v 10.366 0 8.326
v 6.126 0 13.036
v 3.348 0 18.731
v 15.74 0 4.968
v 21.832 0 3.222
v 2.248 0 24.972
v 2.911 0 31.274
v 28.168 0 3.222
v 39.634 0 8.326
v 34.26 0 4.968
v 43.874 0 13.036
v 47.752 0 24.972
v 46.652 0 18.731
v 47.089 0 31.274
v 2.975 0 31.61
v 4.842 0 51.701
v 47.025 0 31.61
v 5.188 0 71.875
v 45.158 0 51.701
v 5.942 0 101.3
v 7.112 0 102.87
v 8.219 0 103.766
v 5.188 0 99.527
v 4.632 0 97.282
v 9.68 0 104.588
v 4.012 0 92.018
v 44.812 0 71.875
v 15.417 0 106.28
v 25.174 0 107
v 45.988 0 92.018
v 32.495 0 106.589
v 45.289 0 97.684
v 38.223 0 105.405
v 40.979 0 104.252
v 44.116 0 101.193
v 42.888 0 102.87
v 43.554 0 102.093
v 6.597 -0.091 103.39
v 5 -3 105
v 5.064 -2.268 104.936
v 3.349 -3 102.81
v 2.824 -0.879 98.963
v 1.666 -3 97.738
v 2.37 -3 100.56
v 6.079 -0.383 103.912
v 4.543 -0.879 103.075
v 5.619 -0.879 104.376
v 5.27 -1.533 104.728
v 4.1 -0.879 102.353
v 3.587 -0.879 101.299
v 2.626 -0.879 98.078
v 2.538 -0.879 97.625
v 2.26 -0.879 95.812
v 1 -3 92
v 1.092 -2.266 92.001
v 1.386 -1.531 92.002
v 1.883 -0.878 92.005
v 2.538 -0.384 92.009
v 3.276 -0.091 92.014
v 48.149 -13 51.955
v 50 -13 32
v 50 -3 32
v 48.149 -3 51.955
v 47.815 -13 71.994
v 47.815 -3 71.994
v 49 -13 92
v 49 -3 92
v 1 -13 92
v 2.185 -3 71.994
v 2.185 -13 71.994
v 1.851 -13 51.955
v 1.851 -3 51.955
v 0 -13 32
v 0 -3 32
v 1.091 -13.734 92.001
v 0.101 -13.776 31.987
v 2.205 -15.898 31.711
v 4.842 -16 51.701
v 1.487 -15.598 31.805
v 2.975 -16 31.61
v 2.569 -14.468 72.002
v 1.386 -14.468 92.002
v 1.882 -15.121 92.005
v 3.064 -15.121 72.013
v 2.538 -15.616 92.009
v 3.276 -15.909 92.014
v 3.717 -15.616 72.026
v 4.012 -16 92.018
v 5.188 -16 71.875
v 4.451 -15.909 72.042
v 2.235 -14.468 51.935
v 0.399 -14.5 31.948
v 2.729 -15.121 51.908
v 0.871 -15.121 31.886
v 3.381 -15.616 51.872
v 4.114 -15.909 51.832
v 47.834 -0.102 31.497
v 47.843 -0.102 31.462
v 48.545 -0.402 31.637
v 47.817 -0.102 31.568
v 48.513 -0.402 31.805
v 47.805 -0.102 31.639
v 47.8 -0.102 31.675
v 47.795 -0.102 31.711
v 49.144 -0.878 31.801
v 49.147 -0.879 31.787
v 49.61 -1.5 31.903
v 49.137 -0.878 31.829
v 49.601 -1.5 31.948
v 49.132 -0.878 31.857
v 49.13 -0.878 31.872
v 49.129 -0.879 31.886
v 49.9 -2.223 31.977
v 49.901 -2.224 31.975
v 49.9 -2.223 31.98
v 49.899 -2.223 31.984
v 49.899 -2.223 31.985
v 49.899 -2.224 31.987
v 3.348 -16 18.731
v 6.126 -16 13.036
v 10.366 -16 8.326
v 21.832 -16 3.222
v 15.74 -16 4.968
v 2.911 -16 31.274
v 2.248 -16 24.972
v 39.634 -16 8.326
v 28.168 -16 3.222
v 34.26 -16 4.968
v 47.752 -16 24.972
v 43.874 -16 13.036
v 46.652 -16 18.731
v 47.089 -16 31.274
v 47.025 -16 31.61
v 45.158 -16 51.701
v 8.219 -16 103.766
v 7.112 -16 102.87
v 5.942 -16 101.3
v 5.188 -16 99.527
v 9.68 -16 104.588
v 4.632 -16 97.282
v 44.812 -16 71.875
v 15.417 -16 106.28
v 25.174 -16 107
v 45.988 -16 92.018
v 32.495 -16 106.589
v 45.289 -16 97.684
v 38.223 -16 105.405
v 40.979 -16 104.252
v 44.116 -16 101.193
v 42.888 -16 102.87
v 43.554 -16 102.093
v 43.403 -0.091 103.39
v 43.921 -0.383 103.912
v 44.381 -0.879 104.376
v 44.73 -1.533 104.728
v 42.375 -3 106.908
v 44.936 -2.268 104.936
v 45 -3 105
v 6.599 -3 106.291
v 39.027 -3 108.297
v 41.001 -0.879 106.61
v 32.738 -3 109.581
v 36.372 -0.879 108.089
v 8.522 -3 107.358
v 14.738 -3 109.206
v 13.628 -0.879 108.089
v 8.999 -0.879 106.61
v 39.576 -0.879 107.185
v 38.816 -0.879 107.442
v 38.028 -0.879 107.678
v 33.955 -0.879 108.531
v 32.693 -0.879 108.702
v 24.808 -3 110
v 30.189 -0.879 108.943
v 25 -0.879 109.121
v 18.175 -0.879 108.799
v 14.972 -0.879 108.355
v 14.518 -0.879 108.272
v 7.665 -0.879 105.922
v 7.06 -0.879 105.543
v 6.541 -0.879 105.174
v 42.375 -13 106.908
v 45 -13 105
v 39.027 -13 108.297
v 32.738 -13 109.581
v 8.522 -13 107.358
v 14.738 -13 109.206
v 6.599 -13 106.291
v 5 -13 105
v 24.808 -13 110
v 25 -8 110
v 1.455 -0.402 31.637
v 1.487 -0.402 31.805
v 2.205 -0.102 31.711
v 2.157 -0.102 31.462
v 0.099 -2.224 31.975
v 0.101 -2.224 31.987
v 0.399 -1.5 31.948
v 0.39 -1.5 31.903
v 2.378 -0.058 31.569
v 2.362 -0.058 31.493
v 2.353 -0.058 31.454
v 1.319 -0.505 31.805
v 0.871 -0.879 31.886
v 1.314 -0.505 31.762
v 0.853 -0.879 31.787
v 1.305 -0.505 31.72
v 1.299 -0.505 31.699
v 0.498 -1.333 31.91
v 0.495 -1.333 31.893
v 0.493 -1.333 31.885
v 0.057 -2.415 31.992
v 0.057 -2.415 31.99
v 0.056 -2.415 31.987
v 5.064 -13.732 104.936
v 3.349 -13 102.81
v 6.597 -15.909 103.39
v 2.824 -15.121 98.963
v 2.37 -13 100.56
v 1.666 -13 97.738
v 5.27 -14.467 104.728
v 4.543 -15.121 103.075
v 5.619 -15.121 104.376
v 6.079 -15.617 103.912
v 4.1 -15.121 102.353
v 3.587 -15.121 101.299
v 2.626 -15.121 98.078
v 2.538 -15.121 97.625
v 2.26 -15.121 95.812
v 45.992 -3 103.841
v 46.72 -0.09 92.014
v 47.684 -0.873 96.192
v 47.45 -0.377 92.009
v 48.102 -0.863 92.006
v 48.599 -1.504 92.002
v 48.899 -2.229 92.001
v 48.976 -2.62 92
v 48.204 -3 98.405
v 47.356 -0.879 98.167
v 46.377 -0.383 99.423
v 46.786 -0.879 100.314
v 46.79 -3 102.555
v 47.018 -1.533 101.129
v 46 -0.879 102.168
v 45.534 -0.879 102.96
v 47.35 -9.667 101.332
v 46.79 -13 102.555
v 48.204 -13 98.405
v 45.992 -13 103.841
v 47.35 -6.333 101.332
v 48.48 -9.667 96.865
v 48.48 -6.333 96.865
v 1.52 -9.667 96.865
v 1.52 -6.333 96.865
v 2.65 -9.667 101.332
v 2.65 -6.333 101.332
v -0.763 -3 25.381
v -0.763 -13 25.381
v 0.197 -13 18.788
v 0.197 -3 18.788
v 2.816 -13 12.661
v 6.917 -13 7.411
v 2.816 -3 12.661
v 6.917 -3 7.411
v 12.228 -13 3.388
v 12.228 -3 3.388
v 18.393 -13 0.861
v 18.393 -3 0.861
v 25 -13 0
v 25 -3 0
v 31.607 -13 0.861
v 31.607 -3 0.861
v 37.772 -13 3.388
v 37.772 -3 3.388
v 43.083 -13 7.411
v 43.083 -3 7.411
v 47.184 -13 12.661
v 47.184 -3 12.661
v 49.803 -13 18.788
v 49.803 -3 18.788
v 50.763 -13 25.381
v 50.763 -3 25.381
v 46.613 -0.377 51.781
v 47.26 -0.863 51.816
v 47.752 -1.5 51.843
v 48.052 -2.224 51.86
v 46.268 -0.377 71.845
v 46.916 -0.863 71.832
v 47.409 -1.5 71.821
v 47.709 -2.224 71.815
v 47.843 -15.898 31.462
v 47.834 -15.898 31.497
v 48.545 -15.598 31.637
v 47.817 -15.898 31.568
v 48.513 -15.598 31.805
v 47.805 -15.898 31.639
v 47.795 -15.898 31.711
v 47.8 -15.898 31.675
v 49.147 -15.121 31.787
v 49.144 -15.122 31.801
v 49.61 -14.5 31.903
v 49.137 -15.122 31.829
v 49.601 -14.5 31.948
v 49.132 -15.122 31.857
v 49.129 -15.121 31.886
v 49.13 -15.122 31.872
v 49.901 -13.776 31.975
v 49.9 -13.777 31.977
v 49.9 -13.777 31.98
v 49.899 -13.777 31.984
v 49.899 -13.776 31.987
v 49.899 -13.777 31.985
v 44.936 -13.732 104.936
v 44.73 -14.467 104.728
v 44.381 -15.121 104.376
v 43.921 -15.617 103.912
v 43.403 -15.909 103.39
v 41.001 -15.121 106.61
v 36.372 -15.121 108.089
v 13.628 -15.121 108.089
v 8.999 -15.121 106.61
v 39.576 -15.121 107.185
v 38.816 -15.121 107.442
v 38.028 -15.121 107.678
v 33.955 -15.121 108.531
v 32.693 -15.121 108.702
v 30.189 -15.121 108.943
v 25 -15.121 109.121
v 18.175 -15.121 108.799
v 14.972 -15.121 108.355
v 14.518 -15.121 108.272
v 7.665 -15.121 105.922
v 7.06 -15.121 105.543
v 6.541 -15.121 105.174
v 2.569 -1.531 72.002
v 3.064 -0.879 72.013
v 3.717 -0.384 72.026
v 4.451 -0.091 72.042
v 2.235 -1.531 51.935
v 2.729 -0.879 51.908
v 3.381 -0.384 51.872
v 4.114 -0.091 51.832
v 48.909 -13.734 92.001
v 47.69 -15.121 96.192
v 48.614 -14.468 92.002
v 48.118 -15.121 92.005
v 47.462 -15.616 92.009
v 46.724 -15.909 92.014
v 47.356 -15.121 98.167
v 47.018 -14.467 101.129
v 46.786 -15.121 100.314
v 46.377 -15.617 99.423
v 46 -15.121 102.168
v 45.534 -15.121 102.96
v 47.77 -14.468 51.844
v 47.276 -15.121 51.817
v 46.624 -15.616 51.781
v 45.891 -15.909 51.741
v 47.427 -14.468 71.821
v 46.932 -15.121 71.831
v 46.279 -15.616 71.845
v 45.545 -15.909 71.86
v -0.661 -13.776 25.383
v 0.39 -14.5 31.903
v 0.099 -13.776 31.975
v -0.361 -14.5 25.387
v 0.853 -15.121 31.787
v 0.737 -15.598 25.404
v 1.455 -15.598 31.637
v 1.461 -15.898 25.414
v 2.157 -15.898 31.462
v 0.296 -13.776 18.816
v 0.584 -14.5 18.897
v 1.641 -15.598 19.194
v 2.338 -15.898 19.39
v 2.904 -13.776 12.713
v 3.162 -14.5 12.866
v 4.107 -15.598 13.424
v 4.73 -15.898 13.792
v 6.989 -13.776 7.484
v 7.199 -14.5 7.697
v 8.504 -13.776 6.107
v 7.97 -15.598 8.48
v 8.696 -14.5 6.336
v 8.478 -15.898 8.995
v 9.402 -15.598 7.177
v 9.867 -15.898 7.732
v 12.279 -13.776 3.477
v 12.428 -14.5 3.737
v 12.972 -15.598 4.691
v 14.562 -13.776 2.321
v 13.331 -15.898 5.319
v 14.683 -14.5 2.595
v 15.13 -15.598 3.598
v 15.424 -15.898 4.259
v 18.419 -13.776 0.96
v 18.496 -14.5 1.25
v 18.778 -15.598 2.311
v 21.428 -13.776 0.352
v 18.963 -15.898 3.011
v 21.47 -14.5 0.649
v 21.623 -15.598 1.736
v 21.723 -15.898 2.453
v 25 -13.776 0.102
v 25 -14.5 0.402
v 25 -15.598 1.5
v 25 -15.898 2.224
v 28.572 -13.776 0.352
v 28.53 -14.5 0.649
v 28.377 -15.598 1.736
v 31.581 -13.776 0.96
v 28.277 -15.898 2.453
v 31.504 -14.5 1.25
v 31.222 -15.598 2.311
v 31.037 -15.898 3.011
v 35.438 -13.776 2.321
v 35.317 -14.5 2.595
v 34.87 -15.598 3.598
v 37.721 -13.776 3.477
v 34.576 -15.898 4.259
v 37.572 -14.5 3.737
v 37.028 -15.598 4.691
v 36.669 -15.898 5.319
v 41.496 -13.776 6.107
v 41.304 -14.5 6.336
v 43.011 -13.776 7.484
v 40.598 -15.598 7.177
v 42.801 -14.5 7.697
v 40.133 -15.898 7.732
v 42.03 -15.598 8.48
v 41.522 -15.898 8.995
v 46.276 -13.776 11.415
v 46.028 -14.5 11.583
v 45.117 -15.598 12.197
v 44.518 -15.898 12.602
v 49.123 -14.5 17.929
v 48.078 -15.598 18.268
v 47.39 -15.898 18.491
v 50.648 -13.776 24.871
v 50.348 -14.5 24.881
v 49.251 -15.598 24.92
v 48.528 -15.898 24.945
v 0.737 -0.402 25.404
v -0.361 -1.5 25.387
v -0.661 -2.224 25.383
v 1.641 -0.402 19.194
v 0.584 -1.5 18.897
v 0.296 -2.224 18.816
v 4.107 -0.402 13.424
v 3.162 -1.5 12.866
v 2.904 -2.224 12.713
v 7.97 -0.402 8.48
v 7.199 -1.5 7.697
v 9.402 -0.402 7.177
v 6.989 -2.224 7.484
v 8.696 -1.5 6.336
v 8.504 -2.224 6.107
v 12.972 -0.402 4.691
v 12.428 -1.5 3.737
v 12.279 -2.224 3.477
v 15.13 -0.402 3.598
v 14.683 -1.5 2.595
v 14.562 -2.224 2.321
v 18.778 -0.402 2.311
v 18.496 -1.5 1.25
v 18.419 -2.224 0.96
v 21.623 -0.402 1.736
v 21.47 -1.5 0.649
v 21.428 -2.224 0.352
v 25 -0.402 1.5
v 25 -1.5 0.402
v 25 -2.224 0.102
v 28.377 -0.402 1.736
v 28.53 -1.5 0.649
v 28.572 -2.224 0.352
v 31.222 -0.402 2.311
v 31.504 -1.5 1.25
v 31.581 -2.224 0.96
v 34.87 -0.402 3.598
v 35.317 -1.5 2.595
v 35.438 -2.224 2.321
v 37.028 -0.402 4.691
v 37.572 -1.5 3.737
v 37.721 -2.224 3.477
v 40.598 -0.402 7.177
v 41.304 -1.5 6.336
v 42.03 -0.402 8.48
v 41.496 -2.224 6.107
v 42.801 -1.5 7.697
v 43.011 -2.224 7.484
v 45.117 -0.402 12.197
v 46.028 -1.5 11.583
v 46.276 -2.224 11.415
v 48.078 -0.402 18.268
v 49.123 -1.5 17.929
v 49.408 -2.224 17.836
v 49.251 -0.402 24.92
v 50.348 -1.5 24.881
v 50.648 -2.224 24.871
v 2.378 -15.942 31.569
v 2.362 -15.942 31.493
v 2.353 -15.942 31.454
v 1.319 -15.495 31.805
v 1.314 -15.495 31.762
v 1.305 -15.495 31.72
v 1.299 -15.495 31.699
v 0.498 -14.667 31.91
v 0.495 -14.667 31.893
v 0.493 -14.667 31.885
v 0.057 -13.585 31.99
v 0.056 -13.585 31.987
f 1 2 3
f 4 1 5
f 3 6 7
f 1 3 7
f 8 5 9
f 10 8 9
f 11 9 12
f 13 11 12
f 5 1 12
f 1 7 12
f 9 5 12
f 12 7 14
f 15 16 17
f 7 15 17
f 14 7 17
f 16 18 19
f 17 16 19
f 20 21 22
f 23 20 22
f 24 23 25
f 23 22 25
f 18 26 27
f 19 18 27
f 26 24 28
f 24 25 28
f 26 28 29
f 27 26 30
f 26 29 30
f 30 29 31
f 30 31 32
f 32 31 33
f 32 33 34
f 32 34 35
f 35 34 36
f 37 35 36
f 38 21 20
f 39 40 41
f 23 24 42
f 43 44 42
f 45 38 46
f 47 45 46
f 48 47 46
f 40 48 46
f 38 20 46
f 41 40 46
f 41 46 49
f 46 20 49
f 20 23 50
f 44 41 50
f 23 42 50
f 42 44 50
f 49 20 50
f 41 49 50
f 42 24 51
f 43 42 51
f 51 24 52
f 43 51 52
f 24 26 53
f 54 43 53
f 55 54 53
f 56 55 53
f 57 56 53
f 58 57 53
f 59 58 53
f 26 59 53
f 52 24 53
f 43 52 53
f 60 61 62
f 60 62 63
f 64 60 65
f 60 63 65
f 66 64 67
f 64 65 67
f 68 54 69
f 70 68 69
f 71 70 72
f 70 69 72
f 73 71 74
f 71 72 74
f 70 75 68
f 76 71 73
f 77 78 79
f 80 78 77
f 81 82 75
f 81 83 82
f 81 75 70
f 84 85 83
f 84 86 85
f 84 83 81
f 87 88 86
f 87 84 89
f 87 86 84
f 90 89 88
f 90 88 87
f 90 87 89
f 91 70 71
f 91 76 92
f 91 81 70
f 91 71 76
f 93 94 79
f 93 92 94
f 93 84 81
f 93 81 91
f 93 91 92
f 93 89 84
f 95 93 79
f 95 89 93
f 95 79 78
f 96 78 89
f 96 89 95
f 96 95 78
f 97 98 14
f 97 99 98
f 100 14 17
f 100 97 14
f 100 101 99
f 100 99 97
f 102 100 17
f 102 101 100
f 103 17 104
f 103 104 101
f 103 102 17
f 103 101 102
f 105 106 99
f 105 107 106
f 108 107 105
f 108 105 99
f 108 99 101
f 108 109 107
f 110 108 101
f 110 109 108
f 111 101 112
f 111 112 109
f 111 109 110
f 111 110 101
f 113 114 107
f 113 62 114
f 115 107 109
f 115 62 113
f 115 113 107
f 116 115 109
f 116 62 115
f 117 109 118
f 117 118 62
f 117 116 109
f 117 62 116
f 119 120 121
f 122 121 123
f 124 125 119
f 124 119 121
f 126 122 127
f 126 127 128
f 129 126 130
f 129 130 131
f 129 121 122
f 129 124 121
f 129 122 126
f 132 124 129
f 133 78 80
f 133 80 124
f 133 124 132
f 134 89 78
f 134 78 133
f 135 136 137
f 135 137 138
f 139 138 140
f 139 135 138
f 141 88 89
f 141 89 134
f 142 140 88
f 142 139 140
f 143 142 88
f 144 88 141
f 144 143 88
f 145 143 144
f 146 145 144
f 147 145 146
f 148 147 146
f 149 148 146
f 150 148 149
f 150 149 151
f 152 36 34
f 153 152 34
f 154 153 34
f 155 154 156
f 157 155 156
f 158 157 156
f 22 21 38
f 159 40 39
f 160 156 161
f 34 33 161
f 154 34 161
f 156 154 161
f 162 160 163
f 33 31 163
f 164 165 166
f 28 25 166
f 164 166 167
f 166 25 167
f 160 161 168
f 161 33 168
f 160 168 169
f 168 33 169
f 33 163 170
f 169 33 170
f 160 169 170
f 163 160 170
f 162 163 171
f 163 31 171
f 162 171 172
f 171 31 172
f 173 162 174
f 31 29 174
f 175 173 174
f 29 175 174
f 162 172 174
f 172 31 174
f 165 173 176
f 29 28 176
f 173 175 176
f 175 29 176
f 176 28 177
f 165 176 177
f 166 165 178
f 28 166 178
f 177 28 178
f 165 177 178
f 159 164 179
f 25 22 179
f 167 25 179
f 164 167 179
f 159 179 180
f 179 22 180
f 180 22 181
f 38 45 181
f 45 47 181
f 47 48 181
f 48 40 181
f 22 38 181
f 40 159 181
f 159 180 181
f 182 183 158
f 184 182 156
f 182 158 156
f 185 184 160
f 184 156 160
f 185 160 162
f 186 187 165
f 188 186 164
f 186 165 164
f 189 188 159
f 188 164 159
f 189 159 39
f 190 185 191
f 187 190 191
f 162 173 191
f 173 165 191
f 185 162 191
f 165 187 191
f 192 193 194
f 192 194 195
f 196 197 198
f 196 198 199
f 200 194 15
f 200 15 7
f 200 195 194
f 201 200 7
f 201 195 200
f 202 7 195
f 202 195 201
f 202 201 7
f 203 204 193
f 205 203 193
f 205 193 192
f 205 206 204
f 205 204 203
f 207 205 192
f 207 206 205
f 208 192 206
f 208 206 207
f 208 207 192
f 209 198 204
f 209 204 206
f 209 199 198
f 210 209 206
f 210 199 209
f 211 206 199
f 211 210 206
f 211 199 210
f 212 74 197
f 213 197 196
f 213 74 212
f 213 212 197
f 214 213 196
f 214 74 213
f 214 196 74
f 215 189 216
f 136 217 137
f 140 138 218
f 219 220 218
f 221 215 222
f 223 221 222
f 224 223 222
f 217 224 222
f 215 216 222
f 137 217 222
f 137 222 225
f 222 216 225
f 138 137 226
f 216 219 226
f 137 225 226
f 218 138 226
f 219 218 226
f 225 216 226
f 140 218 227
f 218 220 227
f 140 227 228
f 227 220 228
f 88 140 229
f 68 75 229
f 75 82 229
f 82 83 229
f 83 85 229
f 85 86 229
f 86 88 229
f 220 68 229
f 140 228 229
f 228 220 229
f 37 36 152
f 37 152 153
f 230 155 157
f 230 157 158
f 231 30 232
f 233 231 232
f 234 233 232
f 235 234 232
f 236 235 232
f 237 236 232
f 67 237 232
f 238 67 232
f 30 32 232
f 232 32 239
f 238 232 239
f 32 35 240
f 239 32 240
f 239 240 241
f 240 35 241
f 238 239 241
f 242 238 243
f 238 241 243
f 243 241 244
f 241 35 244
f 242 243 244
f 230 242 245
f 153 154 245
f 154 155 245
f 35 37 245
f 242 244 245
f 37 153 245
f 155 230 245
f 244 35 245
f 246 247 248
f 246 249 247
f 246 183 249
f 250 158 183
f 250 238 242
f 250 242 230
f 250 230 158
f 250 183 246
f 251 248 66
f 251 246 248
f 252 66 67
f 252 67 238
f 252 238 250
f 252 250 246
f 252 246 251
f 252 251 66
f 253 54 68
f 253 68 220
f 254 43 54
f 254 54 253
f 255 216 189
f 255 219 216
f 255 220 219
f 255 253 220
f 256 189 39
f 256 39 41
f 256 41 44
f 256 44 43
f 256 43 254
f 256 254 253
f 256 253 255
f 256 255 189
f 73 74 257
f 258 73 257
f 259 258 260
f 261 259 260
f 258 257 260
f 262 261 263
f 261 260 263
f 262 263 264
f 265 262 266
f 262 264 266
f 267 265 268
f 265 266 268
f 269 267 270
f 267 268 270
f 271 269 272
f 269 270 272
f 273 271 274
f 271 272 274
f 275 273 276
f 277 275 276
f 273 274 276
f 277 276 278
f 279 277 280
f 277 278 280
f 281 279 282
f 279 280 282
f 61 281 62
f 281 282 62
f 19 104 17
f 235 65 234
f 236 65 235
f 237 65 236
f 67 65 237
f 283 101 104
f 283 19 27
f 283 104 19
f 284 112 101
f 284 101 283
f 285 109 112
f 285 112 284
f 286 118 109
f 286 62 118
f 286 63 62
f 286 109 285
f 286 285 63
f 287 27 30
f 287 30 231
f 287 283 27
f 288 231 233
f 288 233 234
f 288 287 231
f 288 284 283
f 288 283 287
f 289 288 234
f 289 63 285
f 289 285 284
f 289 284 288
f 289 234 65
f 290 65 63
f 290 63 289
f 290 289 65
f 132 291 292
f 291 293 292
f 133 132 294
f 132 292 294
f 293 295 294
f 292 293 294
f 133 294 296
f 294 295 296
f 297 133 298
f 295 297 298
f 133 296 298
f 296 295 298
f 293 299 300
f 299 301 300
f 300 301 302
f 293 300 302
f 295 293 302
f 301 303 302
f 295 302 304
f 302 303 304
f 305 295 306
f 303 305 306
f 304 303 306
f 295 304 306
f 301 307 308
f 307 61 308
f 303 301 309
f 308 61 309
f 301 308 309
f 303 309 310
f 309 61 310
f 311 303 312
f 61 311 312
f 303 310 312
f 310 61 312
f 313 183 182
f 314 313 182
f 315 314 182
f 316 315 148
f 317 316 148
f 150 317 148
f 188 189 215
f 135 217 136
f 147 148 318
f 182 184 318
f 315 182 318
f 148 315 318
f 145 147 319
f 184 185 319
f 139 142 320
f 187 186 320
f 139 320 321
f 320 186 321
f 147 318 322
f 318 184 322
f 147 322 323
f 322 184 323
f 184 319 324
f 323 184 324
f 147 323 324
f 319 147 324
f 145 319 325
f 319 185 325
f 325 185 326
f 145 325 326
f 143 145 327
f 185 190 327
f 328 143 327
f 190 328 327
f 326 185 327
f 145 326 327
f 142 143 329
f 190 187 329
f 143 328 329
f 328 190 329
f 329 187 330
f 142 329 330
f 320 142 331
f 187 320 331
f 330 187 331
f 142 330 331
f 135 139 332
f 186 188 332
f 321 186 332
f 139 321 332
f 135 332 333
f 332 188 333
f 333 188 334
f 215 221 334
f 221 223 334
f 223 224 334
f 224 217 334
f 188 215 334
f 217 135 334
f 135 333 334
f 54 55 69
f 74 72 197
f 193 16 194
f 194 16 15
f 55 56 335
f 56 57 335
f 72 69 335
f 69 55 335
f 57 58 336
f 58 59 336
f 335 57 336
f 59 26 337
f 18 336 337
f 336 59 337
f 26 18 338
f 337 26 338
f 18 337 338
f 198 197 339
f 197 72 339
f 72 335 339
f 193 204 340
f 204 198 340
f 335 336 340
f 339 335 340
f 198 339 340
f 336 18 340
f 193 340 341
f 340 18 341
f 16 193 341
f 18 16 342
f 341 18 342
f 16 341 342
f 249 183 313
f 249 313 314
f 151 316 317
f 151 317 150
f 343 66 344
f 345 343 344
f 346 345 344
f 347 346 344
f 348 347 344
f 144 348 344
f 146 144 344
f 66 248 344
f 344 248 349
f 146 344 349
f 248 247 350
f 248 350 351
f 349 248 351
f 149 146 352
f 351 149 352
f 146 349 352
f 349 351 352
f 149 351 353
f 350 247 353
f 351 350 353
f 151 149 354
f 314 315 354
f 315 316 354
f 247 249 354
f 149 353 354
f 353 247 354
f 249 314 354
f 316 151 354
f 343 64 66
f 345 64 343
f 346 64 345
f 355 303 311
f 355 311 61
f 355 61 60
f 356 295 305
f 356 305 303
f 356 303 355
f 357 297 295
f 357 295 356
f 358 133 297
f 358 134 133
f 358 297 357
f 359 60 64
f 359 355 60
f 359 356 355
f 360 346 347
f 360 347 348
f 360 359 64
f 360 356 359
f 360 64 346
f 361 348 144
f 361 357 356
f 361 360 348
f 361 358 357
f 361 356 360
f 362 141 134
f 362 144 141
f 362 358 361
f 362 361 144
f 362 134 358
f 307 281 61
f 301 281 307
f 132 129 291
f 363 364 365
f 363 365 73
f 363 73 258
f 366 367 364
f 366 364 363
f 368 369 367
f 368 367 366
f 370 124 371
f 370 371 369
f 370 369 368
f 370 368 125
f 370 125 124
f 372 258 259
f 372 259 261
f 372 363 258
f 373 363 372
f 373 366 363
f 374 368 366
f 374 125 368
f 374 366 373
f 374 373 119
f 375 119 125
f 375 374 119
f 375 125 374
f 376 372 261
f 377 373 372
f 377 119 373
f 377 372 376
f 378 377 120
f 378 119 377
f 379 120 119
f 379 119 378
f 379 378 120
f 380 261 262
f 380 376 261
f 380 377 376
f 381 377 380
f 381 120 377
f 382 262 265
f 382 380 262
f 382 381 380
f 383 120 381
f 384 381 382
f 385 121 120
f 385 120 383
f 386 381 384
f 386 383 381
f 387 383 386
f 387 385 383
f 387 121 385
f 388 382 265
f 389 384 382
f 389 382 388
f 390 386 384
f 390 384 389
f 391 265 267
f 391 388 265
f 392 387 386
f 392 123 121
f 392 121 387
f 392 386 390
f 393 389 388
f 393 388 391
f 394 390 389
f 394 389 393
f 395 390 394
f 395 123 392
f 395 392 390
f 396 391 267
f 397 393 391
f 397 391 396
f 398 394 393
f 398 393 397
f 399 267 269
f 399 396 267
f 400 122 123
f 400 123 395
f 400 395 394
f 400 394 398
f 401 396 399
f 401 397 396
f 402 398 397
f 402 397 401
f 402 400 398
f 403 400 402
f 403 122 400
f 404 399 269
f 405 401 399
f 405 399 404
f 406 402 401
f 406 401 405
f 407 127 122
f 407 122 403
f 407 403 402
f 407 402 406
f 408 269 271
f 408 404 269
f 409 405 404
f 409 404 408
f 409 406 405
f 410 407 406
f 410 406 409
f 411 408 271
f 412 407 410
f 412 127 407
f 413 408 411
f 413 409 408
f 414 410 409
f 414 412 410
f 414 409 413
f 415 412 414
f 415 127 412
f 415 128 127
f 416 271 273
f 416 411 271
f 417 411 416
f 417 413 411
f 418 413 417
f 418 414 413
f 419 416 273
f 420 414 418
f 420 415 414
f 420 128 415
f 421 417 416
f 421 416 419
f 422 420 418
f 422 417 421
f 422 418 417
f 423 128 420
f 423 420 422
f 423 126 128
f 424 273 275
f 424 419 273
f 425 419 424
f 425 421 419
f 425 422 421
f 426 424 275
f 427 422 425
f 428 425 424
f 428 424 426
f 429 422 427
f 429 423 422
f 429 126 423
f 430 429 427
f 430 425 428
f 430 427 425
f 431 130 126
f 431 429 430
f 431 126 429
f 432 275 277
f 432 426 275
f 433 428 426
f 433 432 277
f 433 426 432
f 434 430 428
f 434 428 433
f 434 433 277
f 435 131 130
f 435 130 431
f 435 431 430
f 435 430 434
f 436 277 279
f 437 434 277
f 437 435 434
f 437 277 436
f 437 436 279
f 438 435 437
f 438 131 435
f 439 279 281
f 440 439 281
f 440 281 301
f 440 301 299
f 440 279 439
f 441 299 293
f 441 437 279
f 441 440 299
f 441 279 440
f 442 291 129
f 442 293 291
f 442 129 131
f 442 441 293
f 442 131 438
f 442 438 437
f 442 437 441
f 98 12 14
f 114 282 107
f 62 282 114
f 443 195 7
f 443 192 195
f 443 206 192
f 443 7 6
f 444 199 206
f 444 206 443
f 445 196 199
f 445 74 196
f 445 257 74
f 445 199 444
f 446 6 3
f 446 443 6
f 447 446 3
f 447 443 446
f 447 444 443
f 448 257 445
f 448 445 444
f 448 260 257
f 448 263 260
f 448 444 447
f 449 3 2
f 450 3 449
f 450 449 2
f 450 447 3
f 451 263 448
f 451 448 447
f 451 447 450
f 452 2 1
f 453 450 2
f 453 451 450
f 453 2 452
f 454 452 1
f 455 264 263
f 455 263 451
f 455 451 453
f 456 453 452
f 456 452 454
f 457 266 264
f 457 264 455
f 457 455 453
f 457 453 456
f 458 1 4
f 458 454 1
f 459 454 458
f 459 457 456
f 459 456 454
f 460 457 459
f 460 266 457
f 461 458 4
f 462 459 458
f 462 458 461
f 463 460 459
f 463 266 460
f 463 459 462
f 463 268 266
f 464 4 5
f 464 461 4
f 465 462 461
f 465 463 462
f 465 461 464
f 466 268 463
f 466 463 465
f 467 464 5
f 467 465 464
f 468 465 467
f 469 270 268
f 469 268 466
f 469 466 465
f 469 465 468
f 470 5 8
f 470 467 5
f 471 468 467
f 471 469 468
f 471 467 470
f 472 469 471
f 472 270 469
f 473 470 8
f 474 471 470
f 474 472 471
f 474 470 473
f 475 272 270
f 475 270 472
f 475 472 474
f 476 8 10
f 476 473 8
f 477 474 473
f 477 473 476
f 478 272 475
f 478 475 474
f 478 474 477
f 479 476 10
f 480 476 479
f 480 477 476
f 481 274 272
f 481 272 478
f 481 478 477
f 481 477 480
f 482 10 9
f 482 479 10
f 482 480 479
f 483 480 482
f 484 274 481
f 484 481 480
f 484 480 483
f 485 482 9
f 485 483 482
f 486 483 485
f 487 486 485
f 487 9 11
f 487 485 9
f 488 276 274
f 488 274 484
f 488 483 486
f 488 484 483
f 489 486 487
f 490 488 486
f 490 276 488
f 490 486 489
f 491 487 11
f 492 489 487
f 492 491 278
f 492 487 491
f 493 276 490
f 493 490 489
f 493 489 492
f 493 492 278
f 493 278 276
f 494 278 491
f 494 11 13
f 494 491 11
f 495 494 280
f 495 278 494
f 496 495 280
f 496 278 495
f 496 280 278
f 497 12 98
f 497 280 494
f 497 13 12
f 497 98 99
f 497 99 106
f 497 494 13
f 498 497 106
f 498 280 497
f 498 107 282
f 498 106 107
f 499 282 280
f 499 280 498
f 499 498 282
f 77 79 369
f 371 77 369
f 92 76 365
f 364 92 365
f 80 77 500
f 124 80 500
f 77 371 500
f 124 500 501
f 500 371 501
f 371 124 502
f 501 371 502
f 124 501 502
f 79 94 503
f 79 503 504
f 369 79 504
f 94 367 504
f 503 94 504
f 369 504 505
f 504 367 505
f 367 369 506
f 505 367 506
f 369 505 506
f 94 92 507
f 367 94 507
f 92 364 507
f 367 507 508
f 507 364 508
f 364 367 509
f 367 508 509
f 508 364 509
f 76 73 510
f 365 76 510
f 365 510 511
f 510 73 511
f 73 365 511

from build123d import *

# Parameters (mm, degrees)
F1_DEPTH = 16
F2_R     = 3
F3_R     = 3


with BuildPart() as f1:
    # F0 (on Front) → F1 (new body)
    with BuildSketch(Plane.XZ):
        with BuildLine():
            ThreePointArc((1, 92), (2.2082244019, 61.9715295933), (0, 32))
            ThreePointArc((0, 32), (25, 0), (50, 32))
            ThreePointArc((50, 32), (47.7917755981, 61.9715295933), (49, 92))
            Line((49, 92), (25, 92))
            Line((25, 92), (1, 92))
        make_face()
        with BuildLine():
            add(Edge.make_bspline(
                [(1, 92), (1.4186086824, 96.9319457504), (1.8372173648, 101.8638915008), (5, 105)],
                knots=[0, 0, 0, 0, 0.2241015784, 0.2241015784, 0.2241015784, 0.2241015784], degree=3))
            Line((1, 92), (25, 92))
            Line((25, 92), (25, 105))
            Line((25, 105), (5, 105))
        make_face()
        with BuildLine():
            Line((25, 92), (49, 92))
            add(Edge.make_bspline(
                [(45, 105), (48.1627826352, 101.8638915008), (48.5813913176, 96.9319457504), (49, 92)],
                knots=[0.7758984216, 0.7758984216, 0.7758984216, 0.7758984216, 1, 1, 1, 1], degree=3))
            Line((45, 105), (25, 105))
            Line((25, 105), (25, 92))
        make_face()
        with BuildLine():
            add(Edge.make_bspline(
                [(5, 105), (8.8938000478, 108.8609606896), (16.9469000239, 110), (25, 110)],
                knots=[0.2241015784, 0.2241015784, 0.2241015784, 0.2241015784, 0.5, 0.5, 0.5, 0.5], degree=3))
            Line((5, 105), (25, 105))
            Line((25, 105), (25, 110))
        make_face()
        with BuildLine():
            Line((25, 105), (45, 105))
            add(Edge.make_bspline(
                [(25, 110), (33.0530999761, 110), (41.1061999522, 108.8609606896), (45, 105)],
                knots=[0.5, 0.5, 0.5, 0.5, 0.7758984216, 0.7758984216, 0.7758984216, 0.7758984216], degree=3))
            Line((25, 110), (25, 105))
        make_face()
    extrude(amount=F1_DEPTH)

    # F2
    f2_edges = [f1.edges().sort_by_distance(p)[0] for p in [
        (2.208224, -16, 61.97153),
        (25, -16, 0),
        (47.791776, -16, 61.97153),
        (25, -16, 110),
    ]]
    fillet(f2_edges, radius=F2_R)

    # F3
    f3_edges = [f1.edges().sort_by_distance(p)[0] for p in [
        (2.208224, 0, 61.97153),
        (25, 0, 0),
        (47.791776, 0, 61.97153),
        (25, 0, 110),
    ]]
    fillet(f3_edges, radius=F3_R)


solid = f1.part
